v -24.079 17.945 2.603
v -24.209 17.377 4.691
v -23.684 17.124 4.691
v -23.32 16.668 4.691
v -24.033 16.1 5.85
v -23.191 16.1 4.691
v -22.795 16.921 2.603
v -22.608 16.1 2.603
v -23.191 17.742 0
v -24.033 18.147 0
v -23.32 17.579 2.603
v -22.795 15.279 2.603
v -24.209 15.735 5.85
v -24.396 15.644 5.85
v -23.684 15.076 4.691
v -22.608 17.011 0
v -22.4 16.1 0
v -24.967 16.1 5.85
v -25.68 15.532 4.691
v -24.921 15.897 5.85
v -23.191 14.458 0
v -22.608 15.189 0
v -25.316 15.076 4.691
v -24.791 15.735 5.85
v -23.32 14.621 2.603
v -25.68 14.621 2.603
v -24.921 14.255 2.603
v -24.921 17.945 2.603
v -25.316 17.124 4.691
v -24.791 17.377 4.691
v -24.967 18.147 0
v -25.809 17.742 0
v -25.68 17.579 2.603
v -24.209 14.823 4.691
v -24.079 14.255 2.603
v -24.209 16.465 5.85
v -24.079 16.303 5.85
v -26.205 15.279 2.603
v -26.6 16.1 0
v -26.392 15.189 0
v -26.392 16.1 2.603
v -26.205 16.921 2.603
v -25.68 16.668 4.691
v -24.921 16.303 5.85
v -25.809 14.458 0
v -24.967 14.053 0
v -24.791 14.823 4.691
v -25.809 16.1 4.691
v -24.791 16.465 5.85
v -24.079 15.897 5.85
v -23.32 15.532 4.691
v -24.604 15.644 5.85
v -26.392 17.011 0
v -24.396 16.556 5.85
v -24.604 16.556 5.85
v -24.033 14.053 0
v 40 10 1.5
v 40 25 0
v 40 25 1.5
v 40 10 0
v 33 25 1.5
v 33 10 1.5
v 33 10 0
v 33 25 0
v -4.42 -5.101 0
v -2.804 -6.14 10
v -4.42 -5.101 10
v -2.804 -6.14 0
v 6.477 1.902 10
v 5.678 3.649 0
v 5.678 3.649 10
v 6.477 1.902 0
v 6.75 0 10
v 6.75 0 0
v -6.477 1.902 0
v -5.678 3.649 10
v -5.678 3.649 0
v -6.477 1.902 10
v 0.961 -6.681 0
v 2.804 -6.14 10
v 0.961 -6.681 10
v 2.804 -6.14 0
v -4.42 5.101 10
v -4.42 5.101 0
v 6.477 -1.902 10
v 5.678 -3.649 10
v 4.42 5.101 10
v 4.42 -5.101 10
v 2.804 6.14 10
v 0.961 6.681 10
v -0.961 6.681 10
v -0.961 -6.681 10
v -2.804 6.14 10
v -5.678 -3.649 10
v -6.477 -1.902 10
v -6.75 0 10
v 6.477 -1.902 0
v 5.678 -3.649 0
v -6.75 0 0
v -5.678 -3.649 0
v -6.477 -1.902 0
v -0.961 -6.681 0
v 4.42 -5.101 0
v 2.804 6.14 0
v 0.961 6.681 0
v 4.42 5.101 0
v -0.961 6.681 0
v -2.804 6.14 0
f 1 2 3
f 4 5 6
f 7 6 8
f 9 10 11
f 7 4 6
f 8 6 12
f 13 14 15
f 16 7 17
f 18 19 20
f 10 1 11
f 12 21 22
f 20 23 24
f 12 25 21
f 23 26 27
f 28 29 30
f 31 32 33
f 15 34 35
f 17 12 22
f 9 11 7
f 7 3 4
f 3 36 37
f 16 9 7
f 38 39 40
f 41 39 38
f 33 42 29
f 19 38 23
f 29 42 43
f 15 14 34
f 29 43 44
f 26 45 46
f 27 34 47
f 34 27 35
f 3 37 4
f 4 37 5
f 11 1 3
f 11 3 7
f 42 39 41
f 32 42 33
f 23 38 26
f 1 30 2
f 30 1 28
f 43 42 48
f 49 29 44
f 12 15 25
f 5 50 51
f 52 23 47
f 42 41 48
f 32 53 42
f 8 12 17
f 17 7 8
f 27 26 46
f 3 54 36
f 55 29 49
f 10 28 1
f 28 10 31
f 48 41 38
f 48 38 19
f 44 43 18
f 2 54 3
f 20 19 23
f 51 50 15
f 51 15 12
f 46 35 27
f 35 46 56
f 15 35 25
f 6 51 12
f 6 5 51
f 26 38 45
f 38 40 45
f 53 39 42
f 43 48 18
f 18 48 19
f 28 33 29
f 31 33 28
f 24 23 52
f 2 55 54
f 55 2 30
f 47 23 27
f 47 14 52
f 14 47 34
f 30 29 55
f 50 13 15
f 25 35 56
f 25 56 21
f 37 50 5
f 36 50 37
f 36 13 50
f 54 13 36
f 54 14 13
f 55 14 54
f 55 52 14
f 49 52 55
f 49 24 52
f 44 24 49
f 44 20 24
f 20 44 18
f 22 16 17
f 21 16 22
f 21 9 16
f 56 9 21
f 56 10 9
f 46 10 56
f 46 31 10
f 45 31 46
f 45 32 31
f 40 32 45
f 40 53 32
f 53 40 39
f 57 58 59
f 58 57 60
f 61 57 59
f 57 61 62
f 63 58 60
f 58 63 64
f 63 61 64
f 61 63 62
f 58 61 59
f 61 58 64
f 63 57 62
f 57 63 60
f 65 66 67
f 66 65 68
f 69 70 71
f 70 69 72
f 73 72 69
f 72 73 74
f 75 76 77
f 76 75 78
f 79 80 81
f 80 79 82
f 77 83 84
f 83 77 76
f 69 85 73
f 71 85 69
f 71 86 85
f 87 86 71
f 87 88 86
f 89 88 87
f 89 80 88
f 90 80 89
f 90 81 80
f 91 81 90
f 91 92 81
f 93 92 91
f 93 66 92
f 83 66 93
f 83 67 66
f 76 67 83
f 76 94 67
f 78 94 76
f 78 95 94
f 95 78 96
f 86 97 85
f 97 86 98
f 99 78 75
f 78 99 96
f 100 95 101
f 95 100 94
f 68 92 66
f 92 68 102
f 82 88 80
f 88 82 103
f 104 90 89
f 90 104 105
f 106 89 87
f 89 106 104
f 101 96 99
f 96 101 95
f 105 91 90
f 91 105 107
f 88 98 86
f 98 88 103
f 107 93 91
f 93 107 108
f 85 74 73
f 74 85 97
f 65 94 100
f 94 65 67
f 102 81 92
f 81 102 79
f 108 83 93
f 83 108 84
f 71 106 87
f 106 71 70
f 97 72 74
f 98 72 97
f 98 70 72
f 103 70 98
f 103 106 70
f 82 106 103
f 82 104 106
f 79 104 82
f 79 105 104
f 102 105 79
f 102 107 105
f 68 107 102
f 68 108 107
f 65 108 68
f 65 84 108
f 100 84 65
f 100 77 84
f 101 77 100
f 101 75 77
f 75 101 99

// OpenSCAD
ratio=0.5;
rt=0.7; // ratio two

difference() {
	scale([rt,rt,1]) translate([-35,23,0])
		minkowski() {
			translate([-50,-100,0])
				scale([ratio,ratio,10])
				linear_extrude(height=0.1)
				import("omni.dxf");
			difference() {
				scale([0.5,0.5,1]) sphere(r=6,$fn=14);
				translate([-6,-6,-12]) cube([12,12,12]);
			}
		}
//	cube([20,20,20]);
	translate([0,0,0.3])  cylinder(1.75,6.75,6.75);
	translate([0,0,-0.1]) cylinder(1.75,0.5,0.5);
}

translate([33,10,0]) cube([7,15,1.5]);

#cylinder(10,6.75,6.75);
//#cube([10,10,10]);
